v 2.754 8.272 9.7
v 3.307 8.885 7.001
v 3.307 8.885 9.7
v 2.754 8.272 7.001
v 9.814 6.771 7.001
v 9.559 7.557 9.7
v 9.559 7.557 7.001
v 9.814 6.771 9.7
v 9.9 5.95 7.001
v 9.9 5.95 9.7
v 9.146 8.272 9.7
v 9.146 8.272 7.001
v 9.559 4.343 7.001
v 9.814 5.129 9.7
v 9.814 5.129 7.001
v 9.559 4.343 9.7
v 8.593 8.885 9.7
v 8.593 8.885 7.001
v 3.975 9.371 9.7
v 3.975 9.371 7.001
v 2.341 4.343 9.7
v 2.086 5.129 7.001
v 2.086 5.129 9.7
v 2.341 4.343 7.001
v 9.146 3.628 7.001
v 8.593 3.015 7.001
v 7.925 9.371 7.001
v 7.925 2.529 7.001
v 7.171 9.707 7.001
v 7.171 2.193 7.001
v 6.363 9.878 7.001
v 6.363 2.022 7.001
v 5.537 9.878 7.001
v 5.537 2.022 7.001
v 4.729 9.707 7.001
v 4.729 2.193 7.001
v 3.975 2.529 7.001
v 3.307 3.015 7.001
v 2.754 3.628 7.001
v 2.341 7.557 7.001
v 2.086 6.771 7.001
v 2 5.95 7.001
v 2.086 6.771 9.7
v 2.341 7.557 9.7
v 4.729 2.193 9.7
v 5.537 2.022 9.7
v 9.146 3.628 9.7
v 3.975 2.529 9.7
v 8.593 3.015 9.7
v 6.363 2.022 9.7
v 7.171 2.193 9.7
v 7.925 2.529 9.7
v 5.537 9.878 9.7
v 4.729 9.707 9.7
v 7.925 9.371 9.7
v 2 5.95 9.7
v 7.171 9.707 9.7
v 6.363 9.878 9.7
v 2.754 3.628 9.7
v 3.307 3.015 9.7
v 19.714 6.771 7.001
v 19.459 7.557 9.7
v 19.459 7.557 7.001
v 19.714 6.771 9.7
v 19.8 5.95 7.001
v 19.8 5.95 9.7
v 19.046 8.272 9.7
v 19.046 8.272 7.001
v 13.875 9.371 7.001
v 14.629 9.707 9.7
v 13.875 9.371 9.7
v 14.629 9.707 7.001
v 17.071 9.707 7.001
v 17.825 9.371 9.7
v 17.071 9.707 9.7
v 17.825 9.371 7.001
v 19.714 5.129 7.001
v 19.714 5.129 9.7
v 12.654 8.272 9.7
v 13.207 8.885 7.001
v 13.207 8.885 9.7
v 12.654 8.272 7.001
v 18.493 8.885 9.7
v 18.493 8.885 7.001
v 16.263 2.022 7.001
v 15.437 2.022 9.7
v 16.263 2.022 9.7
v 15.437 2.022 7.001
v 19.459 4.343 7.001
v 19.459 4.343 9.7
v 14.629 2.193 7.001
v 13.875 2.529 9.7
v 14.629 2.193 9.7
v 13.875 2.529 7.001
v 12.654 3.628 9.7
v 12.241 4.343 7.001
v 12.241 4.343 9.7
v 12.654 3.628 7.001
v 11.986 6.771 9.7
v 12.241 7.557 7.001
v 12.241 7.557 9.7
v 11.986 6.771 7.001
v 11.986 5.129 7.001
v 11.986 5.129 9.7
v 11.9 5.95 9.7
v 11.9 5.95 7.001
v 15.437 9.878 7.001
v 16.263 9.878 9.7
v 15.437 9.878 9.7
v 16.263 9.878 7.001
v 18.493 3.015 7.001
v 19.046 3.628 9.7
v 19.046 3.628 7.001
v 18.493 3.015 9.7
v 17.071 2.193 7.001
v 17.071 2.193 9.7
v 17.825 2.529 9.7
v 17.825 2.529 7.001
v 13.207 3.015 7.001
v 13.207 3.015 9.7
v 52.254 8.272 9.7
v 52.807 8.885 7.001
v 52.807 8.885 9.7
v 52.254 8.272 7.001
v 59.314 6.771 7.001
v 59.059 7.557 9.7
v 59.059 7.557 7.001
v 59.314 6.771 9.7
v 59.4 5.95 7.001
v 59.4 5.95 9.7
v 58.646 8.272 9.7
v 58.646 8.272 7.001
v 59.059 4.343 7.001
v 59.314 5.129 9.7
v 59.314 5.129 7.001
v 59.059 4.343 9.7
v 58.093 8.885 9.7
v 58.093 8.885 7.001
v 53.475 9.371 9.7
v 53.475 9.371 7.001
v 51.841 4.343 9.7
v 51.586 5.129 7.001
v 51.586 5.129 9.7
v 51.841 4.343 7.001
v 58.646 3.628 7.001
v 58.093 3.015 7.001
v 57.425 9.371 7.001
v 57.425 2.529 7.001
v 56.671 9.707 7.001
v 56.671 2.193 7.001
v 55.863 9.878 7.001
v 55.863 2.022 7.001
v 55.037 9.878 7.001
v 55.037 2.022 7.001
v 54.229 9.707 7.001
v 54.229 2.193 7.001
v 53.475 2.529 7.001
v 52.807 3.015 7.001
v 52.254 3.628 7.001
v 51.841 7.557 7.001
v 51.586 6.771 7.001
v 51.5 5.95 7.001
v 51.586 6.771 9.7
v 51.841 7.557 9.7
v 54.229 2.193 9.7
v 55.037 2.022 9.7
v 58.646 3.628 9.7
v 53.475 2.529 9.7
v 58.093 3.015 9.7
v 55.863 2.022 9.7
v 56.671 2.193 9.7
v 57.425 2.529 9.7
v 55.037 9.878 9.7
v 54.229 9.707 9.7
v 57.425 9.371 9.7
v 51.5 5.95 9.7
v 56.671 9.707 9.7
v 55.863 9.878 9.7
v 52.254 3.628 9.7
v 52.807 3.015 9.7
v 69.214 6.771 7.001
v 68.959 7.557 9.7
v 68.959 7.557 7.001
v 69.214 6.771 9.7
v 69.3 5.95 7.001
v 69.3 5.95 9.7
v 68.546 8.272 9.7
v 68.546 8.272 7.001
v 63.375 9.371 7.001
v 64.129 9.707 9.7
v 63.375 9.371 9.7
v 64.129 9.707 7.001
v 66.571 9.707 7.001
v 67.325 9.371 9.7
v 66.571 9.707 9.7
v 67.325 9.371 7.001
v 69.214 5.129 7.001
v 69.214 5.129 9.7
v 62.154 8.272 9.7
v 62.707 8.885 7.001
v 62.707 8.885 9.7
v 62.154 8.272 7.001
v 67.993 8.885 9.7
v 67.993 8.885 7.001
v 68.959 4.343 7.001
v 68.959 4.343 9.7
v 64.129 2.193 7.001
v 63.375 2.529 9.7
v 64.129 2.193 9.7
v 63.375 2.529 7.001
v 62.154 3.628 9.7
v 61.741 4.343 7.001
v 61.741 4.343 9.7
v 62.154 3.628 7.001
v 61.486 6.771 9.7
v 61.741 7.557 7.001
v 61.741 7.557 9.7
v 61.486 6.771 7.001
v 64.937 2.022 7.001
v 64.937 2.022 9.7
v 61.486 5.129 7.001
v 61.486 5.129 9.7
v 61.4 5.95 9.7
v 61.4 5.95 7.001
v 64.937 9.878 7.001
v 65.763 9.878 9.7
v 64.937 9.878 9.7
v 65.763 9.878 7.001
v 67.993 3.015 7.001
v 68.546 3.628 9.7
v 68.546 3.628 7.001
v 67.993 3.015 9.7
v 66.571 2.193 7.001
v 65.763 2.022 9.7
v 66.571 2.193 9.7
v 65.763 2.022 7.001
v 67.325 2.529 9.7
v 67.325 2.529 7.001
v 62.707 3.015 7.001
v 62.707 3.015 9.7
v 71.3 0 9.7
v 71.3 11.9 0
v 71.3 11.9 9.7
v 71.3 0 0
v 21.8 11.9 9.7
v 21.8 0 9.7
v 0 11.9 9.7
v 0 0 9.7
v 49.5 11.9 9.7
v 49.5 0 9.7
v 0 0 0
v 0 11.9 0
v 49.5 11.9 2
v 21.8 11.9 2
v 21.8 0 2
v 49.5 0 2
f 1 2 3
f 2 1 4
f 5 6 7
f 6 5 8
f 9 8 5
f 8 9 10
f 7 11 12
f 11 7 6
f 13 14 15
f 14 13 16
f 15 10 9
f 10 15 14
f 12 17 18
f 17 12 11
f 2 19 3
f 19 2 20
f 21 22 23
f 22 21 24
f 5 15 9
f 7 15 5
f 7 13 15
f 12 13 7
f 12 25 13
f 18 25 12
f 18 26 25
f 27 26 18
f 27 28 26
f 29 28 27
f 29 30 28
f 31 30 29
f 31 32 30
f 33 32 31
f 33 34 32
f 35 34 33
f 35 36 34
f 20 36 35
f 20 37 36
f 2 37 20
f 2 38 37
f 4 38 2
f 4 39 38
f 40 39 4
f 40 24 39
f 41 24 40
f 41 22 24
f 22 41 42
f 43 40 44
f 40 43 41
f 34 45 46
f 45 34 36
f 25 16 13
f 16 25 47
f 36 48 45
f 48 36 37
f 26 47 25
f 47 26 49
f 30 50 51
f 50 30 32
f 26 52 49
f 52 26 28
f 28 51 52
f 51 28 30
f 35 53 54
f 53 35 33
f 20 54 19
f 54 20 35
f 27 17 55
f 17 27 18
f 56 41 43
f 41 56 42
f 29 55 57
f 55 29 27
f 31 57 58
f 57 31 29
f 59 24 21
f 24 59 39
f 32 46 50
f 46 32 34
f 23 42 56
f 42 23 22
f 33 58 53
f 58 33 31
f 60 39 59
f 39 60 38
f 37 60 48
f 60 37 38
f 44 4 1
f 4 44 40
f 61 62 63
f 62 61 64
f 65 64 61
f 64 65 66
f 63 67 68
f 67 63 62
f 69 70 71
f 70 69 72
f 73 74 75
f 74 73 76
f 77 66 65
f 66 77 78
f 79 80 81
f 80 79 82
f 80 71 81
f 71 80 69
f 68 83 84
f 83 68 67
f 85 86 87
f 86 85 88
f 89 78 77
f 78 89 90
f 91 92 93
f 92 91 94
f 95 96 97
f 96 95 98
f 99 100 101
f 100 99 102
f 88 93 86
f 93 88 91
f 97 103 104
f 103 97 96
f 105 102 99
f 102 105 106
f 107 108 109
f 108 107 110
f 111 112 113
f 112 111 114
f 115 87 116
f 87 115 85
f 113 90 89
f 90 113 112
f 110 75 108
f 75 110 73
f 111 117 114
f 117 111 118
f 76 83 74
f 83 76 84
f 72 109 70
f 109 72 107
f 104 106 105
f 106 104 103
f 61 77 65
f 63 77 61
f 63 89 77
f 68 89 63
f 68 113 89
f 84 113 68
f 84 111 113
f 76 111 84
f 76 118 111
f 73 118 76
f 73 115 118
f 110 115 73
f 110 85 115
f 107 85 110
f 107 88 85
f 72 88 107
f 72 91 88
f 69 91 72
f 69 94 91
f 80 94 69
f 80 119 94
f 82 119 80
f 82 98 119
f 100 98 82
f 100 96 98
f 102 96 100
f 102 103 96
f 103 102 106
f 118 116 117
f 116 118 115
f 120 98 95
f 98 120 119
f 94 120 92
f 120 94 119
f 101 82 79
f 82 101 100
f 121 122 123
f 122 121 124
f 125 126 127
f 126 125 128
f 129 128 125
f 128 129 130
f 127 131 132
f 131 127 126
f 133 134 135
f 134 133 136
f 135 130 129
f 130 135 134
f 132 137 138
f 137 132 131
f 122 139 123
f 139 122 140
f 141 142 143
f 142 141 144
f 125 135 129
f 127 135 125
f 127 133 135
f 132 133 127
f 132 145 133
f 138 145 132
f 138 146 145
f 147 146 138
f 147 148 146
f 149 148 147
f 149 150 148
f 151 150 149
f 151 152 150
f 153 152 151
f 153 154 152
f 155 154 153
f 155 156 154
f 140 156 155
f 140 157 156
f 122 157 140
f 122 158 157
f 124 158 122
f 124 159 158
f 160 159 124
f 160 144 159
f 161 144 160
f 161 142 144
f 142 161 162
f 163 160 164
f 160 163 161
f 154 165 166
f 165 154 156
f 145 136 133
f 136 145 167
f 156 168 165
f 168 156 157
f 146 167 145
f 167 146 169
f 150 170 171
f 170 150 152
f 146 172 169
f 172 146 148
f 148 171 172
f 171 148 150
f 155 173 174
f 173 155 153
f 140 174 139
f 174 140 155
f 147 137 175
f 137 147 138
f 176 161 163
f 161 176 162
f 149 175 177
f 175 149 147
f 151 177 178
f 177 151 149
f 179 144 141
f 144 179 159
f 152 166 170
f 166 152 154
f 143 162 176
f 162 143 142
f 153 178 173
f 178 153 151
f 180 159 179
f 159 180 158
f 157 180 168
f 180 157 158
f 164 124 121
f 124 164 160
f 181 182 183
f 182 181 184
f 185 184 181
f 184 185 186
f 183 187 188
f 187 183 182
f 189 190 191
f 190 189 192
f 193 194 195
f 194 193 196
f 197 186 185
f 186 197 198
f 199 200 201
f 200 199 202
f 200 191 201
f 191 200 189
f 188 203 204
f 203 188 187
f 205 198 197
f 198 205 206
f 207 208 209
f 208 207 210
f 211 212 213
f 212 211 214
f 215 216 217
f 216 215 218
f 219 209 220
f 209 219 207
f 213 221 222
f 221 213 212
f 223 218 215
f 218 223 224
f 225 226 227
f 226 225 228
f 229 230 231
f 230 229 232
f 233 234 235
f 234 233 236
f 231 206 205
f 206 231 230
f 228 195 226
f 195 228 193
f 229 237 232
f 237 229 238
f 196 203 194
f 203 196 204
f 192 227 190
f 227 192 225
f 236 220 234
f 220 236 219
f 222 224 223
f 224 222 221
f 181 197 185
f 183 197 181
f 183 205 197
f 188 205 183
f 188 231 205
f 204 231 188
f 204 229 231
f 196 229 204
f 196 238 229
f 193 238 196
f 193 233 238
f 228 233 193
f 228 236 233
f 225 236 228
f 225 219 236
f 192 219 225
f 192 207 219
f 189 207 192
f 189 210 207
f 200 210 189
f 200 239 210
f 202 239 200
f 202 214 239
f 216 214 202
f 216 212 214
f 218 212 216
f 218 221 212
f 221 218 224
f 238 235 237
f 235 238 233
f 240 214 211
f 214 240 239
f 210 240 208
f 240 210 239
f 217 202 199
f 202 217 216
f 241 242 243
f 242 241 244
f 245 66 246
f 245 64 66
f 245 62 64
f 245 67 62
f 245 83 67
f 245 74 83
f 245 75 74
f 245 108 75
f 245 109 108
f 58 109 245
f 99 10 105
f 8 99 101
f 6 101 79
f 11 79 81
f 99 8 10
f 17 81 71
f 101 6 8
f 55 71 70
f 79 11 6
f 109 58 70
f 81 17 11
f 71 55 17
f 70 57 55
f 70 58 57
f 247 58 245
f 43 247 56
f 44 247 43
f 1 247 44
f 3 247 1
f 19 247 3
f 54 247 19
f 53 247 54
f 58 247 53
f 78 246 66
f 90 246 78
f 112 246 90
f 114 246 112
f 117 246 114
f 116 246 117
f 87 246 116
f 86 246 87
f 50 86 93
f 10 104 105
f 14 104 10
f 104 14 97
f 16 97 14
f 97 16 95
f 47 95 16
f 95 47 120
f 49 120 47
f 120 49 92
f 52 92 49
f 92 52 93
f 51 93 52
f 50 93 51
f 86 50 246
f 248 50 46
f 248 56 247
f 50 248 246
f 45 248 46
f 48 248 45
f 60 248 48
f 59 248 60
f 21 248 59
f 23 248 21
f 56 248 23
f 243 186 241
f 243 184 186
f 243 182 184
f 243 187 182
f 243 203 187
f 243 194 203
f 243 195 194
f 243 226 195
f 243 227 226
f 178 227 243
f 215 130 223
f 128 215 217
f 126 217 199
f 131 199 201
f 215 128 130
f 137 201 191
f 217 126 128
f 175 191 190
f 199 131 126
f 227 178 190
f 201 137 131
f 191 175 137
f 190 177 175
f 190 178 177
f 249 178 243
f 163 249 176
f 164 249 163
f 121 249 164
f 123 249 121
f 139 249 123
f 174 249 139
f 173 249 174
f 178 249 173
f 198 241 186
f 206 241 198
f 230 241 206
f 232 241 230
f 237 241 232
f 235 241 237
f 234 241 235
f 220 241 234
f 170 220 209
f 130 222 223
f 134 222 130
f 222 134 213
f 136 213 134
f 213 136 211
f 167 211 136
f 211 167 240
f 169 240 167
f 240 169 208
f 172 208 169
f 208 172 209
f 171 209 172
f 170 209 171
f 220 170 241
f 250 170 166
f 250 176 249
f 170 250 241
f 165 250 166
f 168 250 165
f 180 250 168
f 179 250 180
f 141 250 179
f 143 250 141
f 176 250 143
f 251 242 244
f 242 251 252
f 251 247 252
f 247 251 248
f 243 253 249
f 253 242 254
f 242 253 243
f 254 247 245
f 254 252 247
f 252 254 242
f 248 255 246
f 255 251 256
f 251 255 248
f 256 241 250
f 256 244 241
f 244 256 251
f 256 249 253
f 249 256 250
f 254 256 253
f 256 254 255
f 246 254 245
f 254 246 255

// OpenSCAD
// A thing that can be connected to a cable to make it magnetic

magnet_d = 7.9;
magnet_h = 2.7;
wall_thicc = 2;

$fn=30;

module cutout() {
    r = magnet_d / 2;
    cylinder(magnet_h, r, r);
}


difference() {
    cube([(magnet_d + wall_thicc) * 7 + wall_thicc, magnet_d + wall_thicc*2, magnet_h + wall_thicc + 5]);

    translate([wall_thicc + magnet_d/2, wall_thicc + magnet_d / 2, wall_thicc + .001 + 5])
    for (i = [0,1,5,6]) {
        #translate([i *(wall_thicc + magnet_d), 0, 0]) cutout();
    }

    translate([2 *(wall_thicc+magnet_d) + wall_thicc, -1, wall_thicc])
        cube([3 *(wall_thicc+magnet_d) - wall_thicc, magnet_d + wall_thicc*2 + 2, 10]);
}
